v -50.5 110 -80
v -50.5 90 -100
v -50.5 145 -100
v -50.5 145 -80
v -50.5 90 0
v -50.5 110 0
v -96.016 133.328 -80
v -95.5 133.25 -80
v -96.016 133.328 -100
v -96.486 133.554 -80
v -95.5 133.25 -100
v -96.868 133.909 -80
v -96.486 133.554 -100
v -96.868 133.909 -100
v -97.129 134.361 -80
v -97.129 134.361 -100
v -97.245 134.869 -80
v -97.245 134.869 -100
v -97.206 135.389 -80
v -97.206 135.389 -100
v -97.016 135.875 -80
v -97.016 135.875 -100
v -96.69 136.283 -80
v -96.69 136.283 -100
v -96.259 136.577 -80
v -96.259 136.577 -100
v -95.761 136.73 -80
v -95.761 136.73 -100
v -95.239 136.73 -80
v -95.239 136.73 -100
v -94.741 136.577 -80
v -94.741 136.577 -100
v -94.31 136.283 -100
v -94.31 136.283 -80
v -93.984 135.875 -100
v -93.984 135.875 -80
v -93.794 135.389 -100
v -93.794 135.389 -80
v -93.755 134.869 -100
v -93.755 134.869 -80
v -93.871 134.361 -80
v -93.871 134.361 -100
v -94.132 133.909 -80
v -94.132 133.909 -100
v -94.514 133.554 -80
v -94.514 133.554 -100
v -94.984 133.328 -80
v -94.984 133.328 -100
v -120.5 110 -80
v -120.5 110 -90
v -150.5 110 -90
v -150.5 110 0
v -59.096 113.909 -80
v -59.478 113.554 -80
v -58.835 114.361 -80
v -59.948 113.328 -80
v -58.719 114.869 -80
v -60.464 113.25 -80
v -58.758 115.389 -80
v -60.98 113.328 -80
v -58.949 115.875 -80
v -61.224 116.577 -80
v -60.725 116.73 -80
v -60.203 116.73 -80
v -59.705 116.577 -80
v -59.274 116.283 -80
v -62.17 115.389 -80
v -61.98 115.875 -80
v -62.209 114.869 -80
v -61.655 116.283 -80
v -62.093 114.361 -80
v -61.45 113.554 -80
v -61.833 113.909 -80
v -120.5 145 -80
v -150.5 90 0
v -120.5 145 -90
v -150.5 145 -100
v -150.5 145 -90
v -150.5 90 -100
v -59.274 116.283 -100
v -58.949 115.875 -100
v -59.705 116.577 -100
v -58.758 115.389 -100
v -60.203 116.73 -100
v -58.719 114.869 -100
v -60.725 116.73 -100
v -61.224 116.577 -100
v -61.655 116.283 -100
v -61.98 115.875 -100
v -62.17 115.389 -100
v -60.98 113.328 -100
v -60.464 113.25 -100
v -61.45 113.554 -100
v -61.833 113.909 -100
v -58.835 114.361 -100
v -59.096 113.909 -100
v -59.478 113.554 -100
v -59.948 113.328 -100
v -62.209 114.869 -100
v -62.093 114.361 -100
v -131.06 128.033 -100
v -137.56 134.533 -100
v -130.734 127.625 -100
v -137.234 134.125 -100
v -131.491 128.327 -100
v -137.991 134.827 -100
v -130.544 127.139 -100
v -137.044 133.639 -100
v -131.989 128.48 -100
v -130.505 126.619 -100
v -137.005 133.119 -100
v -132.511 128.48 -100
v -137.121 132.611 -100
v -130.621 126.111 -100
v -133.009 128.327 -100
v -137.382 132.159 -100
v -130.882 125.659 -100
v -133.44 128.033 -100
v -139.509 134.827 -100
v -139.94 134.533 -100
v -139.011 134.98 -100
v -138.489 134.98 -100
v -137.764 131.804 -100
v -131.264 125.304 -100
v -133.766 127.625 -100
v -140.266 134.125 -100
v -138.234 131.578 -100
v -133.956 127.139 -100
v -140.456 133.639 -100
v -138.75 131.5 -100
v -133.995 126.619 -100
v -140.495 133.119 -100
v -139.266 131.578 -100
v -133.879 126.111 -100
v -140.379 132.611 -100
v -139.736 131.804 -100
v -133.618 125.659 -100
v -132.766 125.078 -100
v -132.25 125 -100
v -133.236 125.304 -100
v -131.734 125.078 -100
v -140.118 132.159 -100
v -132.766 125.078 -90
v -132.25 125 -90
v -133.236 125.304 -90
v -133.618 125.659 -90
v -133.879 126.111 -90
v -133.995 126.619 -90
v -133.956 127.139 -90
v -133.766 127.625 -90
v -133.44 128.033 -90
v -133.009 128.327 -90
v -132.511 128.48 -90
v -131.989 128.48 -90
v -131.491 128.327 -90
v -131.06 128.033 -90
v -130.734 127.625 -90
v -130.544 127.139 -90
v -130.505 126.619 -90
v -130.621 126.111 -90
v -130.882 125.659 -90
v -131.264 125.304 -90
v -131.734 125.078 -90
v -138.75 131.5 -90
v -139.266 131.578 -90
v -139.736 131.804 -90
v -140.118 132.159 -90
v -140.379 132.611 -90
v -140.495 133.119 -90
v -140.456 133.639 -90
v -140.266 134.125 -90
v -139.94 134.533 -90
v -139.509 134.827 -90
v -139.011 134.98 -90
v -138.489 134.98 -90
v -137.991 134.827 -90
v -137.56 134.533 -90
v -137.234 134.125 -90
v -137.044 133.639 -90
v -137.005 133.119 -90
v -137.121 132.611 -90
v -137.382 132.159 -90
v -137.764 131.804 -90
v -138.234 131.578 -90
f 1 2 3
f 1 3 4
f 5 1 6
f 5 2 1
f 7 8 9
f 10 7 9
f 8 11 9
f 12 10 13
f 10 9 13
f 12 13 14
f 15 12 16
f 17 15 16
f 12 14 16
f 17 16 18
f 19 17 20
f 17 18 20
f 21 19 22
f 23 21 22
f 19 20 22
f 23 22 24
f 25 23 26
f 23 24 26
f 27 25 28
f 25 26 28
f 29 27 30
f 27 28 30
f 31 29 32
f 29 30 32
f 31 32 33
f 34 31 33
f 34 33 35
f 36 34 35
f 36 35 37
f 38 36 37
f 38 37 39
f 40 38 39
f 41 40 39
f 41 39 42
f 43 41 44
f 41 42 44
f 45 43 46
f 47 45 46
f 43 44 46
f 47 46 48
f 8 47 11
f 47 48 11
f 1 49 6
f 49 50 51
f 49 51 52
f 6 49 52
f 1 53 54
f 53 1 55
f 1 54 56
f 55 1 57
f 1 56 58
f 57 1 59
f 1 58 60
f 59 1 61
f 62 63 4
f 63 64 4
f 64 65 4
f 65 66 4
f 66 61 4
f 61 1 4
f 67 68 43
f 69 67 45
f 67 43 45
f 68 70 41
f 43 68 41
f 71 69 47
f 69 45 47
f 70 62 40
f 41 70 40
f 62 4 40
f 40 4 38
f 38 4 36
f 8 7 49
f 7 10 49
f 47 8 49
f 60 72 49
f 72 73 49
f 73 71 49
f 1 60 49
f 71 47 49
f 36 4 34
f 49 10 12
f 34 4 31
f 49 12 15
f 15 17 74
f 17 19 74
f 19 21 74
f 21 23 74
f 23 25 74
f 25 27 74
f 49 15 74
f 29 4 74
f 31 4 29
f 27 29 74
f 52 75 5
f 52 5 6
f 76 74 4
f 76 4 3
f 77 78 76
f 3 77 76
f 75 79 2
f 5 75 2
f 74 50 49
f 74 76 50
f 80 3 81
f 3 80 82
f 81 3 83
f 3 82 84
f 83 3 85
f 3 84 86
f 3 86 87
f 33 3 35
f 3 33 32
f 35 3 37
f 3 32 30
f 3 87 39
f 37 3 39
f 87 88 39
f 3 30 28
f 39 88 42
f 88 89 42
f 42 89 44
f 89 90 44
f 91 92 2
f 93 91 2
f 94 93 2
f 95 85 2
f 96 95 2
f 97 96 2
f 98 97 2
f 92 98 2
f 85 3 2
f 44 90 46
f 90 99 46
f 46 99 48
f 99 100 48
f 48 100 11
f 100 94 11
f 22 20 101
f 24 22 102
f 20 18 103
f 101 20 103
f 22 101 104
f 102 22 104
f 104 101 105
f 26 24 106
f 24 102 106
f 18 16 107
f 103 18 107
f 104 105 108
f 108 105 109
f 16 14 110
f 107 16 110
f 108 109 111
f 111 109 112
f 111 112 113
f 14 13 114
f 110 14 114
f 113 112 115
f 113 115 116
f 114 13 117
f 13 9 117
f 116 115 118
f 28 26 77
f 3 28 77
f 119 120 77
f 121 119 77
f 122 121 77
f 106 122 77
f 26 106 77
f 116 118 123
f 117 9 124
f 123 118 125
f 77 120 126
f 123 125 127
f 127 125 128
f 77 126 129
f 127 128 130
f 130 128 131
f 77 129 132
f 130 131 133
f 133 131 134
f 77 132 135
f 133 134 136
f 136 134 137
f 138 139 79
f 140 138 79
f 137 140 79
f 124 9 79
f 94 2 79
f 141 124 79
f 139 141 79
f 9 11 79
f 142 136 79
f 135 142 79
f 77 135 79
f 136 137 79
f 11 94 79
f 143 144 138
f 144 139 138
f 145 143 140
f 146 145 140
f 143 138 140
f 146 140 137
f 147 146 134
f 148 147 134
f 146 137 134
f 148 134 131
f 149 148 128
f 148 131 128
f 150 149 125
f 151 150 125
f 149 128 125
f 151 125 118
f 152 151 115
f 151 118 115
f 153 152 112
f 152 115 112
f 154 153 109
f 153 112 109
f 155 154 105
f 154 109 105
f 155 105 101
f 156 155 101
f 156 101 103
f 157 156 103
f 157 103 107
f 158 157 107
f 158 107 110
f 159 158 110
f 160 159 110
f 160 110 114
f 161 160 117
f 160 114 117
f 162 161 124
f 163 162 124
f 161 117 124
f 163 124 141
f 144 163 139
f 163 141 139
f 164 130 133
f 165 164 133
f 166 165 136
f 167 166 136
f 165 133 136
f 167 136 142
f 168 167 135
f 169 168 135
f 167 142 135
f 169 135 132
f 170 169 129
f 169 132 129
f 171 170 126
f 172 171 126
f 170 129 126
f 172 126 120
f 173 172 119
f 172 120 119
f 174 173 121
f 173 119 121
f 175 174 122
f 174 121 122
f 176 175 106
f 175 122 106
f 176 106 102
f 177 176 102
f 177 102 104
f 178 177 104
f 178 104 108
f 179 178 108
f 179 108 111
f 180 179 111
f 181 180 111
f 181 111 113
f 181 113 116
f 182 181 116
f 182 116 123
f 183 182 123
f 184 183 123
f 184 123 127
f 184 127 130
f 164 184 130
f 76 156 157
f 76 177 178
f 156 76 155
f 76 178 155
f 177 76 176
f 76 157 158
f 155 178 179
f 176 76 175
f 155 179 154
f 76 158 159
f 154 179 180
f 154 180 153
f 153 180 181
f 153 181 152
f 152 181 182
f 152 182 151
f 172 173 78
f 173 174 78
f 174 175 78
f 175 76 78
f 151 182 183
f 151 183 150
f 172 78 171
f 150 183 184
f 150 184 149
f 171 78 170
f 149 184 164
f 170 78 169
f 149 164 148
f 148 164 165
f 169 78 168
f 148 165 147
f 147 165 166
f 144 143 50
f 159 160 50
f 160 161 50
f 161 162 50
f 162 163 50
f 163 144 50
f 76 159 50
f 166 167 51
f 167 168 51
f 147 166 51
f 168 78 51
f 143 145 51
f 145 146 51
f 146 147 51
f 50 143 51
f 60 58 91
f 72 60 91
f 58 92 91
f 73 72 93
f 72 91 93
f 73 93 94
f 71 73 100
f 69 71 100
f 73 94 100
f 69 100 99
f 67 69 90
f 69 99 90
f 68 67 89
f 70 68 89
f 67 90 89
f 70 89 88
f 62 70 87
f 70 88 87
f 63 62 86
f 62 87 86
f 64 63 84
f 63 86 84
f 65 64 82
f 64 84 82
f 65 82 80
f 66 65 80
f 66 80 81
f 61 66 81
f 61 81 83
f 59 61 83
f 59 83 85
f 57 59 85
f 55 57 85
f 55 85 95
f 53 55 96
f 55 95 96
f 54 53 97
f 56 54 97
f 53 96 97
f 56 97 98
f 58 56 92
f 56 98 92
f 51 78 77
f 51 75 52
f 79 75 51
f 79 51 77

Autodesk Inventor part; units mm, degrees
ref_plane "YZ Plane" through (0, 0, 0) normal (1, 0, 0) x (0, 1, 0)
ref_plane "XZ Plane" through (0, 0, 0) normal (0, 1, 0) x (-1, 0, 0)
ref_plane "XY Plane" through (0, 0, 0) normal (0, 0, 1) x (1, 0, 0)
sketch "Boceto2" plane through (0, 0, 0) normal (0, 1, 0) x (-1, 0, 0)
  line L0 (7.5, 100) -> (-7.5, 100)
  line L1 (-7.5, 100) -> (-7.5, -100)
  line L2 (-7.5, -100) -> (7.5, -100)
  line L3 (7.5, -100) -> (7.5, 100)
  line L4 (7.5, 100) -> (-7.5, -100) construction
  line L5 (-7.5, 100) -> (7.5, -100) construction
  point P0 (0, 0)
  dimension "d7" = 15
  dimension "d8" = 200
extrude "Extrusión1" add sketch "Boceto2" along normal blind 10
sketch "Boceto3" plane through (0, 10, 0) normal (0, 1, 0) x (1, 0, 0)
  circle A0 centre (3.25, 58.25) radius 1.75
  line L0 (5, 50) -> (-5, 50)
  line L1 (-5, 50) -> (-5, 60)
  line L2 (-5, 60) -> (5, 60)
  line L3 (5, 60) -> (5, 50)
  line L4 (5, 50) -> (-5, 60) construction
  line L5 (-5, 50) -> (5, 60) construction
  circle A1 centre (-3.25, 51.75) radius 1.75
  line L6 (7.5, 100) -> (-7.5, 100) projected
  line L7 (-7.5, 0) -> (3.408, 0)
  line L8 (5, -60) -> (5, -50)
  line L9 (-5, -60) -> (5, -60)
  line L10 (5, -50) -> (-5, -50)
  line L11 (-5, -50) -> (-5, -60)
  line L12 (-5, -50) -> (5, -60) construction
  circle A2 centre (-3.25, -51.75) radius 1.75
  line L13 (5, -50) -> (-5, -60) construction
  circle A3 centre (3.25, -58.25) radius 1.75
  line L14 (-7.5, -100) -> (7.5, -100) projected
  point P0 (0, 0)
  point P1 (-5, 55)
  point P2 (0, 100)
  point P3 (-5, -55)
  dimension "d11" = 3.5
  dimension "d12" = 1.75
  dimension "d13" = 1.75
  dimension "d14" = 1.75
  dimension "d15" = 1.75
  dimension "d16" = 10
  dimension "d17" = 10
  dimension "d19" = 40
  dimension "d81" = 40
hole "Agujero1" at (3.25, 10, 58.25) at (-3.25, 10, 51.75) at (3.25, 10, -58.25) at (-3.25, 10, -51.75) direction (0, -1, 0) diameter 3.5 end through all
sketch "Boceto4" plane through (0, 10, 0) normal (0, 1, 0) x (1, 0, 0)
  line L0 (-7.5, 100) -> (-7.5, -100) projected
  line L1 (-7.5, -100) -> (7.5, -100)
  line L2 (7.5, -100) -> (7.5, -80)
  line L3 (7.5, -80) -> (-7.5, -80)
  line L4 (-7.5, -80) -> (-7.5, -100)
  line L5 (-7.5, 0) -> (1.0116, 0)
  line L6 (-7.5, -100) -> (-7.5, 100)
  line L7 (-7.5, 100) -> (7.5, 100)
  line L8 (7.5, 100) -> (7.5, 80)
  line L9 (7.5, 80) -> (-7.5, 80)
  line L10 (-7.5, 80) -> (-7.5, 100)
  point P0 (0, 0)
  point P1 (-7.5, -80)
  point P2 (-7.5, 80)
  dimension "d27" = 15
  dimension "d28" = 20
extrude "Extrusión2" add sketch "Boceto4" along normal blind 80
sketch "Boceto5" plane through (0, 90, 0) normal (0, 1, 0) x (1, 0, 0)
  line L0 (-7.5, -100) -> (7.5, -100) projected
  line L1 (-7.5, -100) -> (49.5, -100)
  line L2 (49.5, -100) -> (49.5, 100)
  line L3 (49.5, 100) -> (-7.5, 100)
  line L4 (-7.5, 100) -> (-7.5, -100)
  line L5 (49.5, -100) -> (-150.5, -100)
  line L6 (-150.5, -100) -> (-150.5, 100)
  line L7 (-150.5, 100) -> (49.5, 100)
  line L8 (49.5, 100) -> (49.5, -100)
  point P0 (0, 0)
  point P1 (-7.5, 100)
  dimension "d31" = 57
  dimension "d32" = 200
  dimension "d75" = 200
extrude "Extrusión3" add sketch "Boceto5" along normal blind 110
sketch "Boceto6" plane through (0, 200, 0) normal (0, 1, 0) x (1, 0, 0)
  line L0 (49.5, 100) -> (7.5, 100) projected
  line L1 (49.5, 100) -> (29.5, 100)
  line L2 (29.5, 100) -> (29.5, 80)
  line L3 (7.5, -100) -> (49.5, -100) projected
  line L4 (28.5, -100) -> (28.5, -80)
  line L5 (-150.5, 100) -> (-150.5, -100) projected
  line L6 (29.5, 80) -> (-150.5, 80)
  line L7 (-150.5, 80) -> (-150.5, -80)
  line L8 (-150.5, -80) -> (29.5, -80)
  line L9 (29.5, -80) -> (29.5, 80)
  line L10 (-150.5, -100) -> (49.5, -100) projected
  point P0 (7.5, 80)
  point P1 (-50.5, -100)
  dimension "d36" = 20
  dimension "d37" = 20
  dimension "d38" = 20
  dimension "d77" = 20
extrude "Extrusión4" cut sketch "Boceto6" against normal blind 90 contours L8 L5 L6 L9
sketch "Boceto7" plane through (-150.5, 90, -100) normal (-1, 0, 0) x (0, 0, 1)
  line L0 (0, 110) -> (20, 110) projected
  line L1 (20, 110) -> (10, 110)
  line L2 (10, 110) -> (10, 20)
  line L3 (10, 20) -> (20, 20)
  line L4 (20, 20) -> (20, 110)
  line L5 (180, 110) -> (180, 20) projected
  line L6 (180, 110) -> (190, 110)
  line L7 (190, 110) -> (190, 20)
  line L8 (190, 20) -> (180, 20)
  line L9 (180, 20) -> (180, 110)
  line L10 (200, 0) -> (200, 110) projected
  line L11 (0, 0) -> (0, 110) projected
  line L12 (0, 110) -> (10, 110)
  line L13 (10, 110) -> (10, 20)
  line L14 (10, 20) -> (0, 20)
  line L15 (0, 20) -> (0, 110)
  line L16 (200, 110) -> (0, 110) projected
  line L17 (200, 110) -> (190, 110)
  line L18 (190, 110) -> (190, 20)
  line L19 (190, 20) -> (200, 20)
  line L20 (200, 20) -> (200, 110)
  point P0 (100, -90)
  dimension "d63" = 10
  dimension "d65" = 10
  dimension "d76" = 10
extrude "Extrusión5" cut sketch "Boceto7" against normal blind 30 contours L6 L7 L8 L5 | L0 L4 L3 L2
sketch "Boceto8" plane through (-7.5, 0, 100) normal (0, 0, 1) x (1, 0, 0)
  line L0 (-113, 110) -> (-113, 200) projected
  line L1 (-113, 200) -> (-113, 110)
  circle A0 centre (-124.75, 183.25) radius 1.75
  line L2 (-123, 175) -> (-133, 175)
  line L3 (-133, 175) -> (-133, 185)
  line L4 (-133, 185) -> (-123, 185)
  line L5 (-123, 185) -> (-123, 175)
  line L6 (-123, 175) -> (-133, 185) construction
  line L7 (-133, 175) -> (-123, 185) construction
  circle A1 centre (-131.25, 176.75) radius 1.75
  line L8 (-143, 200) -> (57, 200) projected
  line L9 (-143, 90) -> (-143, 200) projected
  line L10 (-113, 155) -> (-128, 155)
  line L11 (-123, 125) -> (-123, 135)
  line L12 (-133, 125) -> (-123, 125)
  line L13 (-123, 135) -> (-133, 125) construction
  line L14 (-123, 135) -> (-133, 135)
  line L15 (-133, 135) -> (-123, 125) construction
  circle A2 centre (-131.25, 133.25) radius 1.75
  line L16 (-133, 135) -> (-133, 125)
  circle A3 centre (-124.75, 126.75) radius 1.75
  line L17 (-143, 110) -> (-113, 110) projected
  point P0 (7.5, 0)
  point P1 (-133, 180)
  point P2 (-123, 180)
  point P3 (-133, 130)
  point P4 (-123, 130)
  dimension "d45" = 3.5
  dimension "d46" = 1.75
  dimension "d47" = 1.75
  dimension "d48" = 1.75
  dimension "d49" = 1.75
  dimension "d50" = 10
  dimension "d51" = 10
  dimension "d52" = 15
  dimension "d53" = 10
  dimension "d54" = 10
  dimension "d55" = 15
hole "Agujero2" at (-132.25, 183.25, 100) at (-138.75, 176.75, 100) at (-138.75, 133.25, 100) at (-132.25, 126.75, 100) direction (0, 0, -1) diameter 3.5 end through all
ref_plane "Plano de trabajo1" through (-150.5, 90, 100) normal (0, -1, 0) x (1, 0, 0)
split "Dividir1" plane through (-150.5, 90, 100) removes the side toward (0, -1, 0)
ref_plane "Plano de trabajo2" through (49.5, 90, 0) normal (0, 0, -1) x (-1, 0, 0)
ref_plane "Plano de trabajo3" through (-50.5, 90, 100) normal (1, 0, 0) x (0, 0, -1)
ref_plane "Plano de trabajo4" through (0, 145, 0) normal (0, 1, 0) x (1, 0, 0)
sketch "Boceto9" plane through (-150.5, 90, 100) normal (0, 0, 1) x (1, 0, 0)
  line L0 (85.0357, 30) -> (115.0357, 30)
  circle A0 centre (110.0357, 25) radius 1.75
  line L1 (90.0357, 25) -> (110.0357, 25)
  line L2 (115.0357, 30) -> (115.0357, 20)
  circle A1 centre (90.0357, 25) radius 1.75
  line L3 (85.0357, 20) -> (115.0357, 30) construction
  line L4 (85.0357, 30) -> (115.0357, 20) construction
  line L5 (85.0357, 20) -> (85.0357, 30)
  line L6 (115.0357, 20) -> (85.0357, 20)
  line L7 (200, 0) -> (200, 110)
  line L8 (200, 55) -> (88.2857, 55)
  circle A2 centre (90.0357, 85) radius 1.75
  line L9 (85.0357, 80) -> (115.0357, 80)
  line L10 (85.0357, 80) -> (115.0357, 90) construction
  line L11 (85.0357, 90) -> (85.0357, 80)
  line L12 (115.0357, 90) -> (85.0357, 90)
  line L13 (85.0357, 90) -> (115.0357, 80) construction
  circle A3 centre (110.0357, 85) radius 1.75
  line L14 (90.0357, 85) -> (110.0357, 85)
  line L15 (115.0357, 80) -> (115.0357, 90)
  line L16 (100.0357, 55) -> (185.099, 55) construction
  line L17 (160, 70) -> (160, 40)
  circle A4 centre (165, 45) radius 1.75
  line L18 (170, 40) -> (170, 70)
  line L19 (170, 70) -> (160, 40) construction
  line L20 (160, 40) -> (170, 40)
  line L21 (160, 70) -> (170, 40) construction
  circle A5 centre (165, 65) radius 1.75
  line L22 (165, 65) -> (165, 45)
  line L23 (170, 70) -> (160, 70)
  circle A6 centre (55, 65) radius 1.75
  line L24 (60, 70) -> (60, 40)
  line L25 (60, 40) -> (50, 40)
  circle A7 centre (55, 45) radius 1.75
  line L26 (55, 65) -> (55, 45)
  line L27 (60, 70) -> (50, 40) construction
  line L28 (50, 40) -> (50, 70)
  line L29 (50, 70) -> (60, 40) construction
  line L30 (50, 70) -> (60, 70)
  line L31 (30, 110) -> (30, 20)
  point P0 (150.5, -90)
  point P1 (100.0357, 34.7141)
  point P2 (100.0357, 34.7141)
  point P3 (85.0357, 36.6749)
  point P4 (115.0357, 25)
  point P5 (115.0357, 85)
  point P6 (189.1833, 40)
  point P7 (165, 70)
  point P8 (70.0357, 40)
  point P9 (55, 70)
  dimension "d89" = 10
  dimension "d90" = 30
  dimension "d91" = 5
  dimension "d92" = 5
  dimension "d93" = 5
  dimension "d94" = 5
  dimension "d95" = 30
  dimension "d96" = 5
  dimension "d97" = 5
  dimension "d98" = 3.5
  dimension "d99" = 5
  dimension "d100" = 5
  dimension "d101" = 5
  dimension "d102" = 5
  dimension "d103" = 5
  dimension "d104" = 20
hole "Agujero3" at (-60.4643, 175, 100) at (-40.4643, 175, 100) at (14.5, 155, 100) at (-95.5, 155, 100) at (-95.5, 135, 100) at (-60.4643, 115, 100) at (-40.4643, 115, 100) at (14.5, 135, 100) direction (0, 0, -1) diameter 3.5 end through all
sketch "Boceto10" plane through (49.5, 90, 100) normal (1, 0, 0) x (0, 0, -1)
  line L0 (85.0357, 30) -> (115.0357, 30)
  circle A0 centre (110.0357, 25) radius 1.75
  line L1 (90.0357, 25) -> (110.0357, 25)
  line L2 (115.0357, 30) -> (115.0357, 20)
  circle A1 centre (90.0357, 25) radius 1.75
  line L3 (85.0357, 30) -> (115.0357, 20) construction
  line L4 (85.0357, 20) -> (85.0357, 30)
  line L5 (115.0357, 20) -> (85.0357, 20)
  line L6 (85.0357, 20) -> (115.0357, 30) construction
  line L7 (160, 70) -> (160, 40)
  circle A2 centre (165, 45) radius 1.75
  line L8 (160, 40) -> (170, 40)
  line L9 (165, 65) -> (165, 45)
  circle A3 centre (165, 65) radius 1.75
  line L10 (170, 70) -> (160, 40) construction
  line L11 (170, 70) -> (160, 70)
  line L12 (160, 70) -> (170, 40) construction
  line L13 (170, 40) -> (170, 70)
  line L14 (40, 70) -> (40, 40)
  line L15 (35, 65) -> (35, 45)
  circle A4 centre (35, 65) radius 1.75
  line L16 (40, 40) -> (30, 40)
  line L17 (40, 70) -> (30, 40) construction
  line L18 (30, 70) -> (40, 40) construction
  line L19 (30, 70) -> (40, 70)
  line L20 (30, 40) -> (30, 70)
  circle A5 centre (35, 45) radius 1.75
  circle A6 centre (90.0357, 85) radius 1.75
  line L21 (85.0357, 80) -> (115.0357, 80)
  line L22 (115.0357, 80) -> (115.0357, 90)
  circle A7 centre (110.0357, 85) radius 1.75
  line L23 (90.0357, 85) -> (110.0357, 85)
  line L24 (85.0357, 80) -> (115.0357, 90) construction
  line L25 (85.0357, 90) -> (85.0357, 80)
  line L26 (115.0357, 90) -> (85.0357, 90)
  line L27 (85.0357, 90) -> (115.0357, 80) construction
  line L28 (0, 0) -> (0, 110)
  line L29 (200, 0) -> (200, 110)
  point P0 (100, -90)
  point P1 (100.0357, 34.7141)
  point P2 (100.0357, 34.7141)
  point P3 (85.0357, 36.6749)
  point P4 (115.0357, 25)
  point P5 (88.2857, 55)
  point P6 (189.1833, 40)
  point P7 (165, 70)
  point P8 (70.0357, 40)
  point P9 (35, 70)
  point P10 (115.0357, 85)
  point P11 (100.0357, 55)
  dimension "d112" = 10
  dimension "d113" = 30
  dimension "d114" = 5
  dimension "d115" = 5
  dimension "d116" = 5
  dimension "d117" = 5
  dimension "d118" = 5
  dimension "d119" = 5
  dimension "d120" = 3.5
  dimension "d121" = 5
  dimension "d122" = 5
  dimension "d123" = 5
  dimension "d124" = 5
  dimension "d125" = 5
  dimension "d126" = 30
  dimension "d127" = 30
hole "Agujero4" at (49.5, 175, 9.9643) at (49.5, 175, -10.0357) at (49.5, 155, 65) at (49.5, 135, 65) at (49.5, 115, 9.9643) at (49.5, 115, -10.0357) at (49.5, 135, -65) at (49.5, 155, -65) direction (-1, 0, 0) diameter 3.5 end through all
split "Dividir2" plane through (-50.5, 90, 100) removes the side toward (1, 0, 0)
split "Dividir3" plane through (0, 145, 0) removes the side toward (0, 1, 0)
split "Dividir4" plane through (49.5, 90, 0) removes the side toward (0, 0, 1)
properties part number "container_front_head_3"
